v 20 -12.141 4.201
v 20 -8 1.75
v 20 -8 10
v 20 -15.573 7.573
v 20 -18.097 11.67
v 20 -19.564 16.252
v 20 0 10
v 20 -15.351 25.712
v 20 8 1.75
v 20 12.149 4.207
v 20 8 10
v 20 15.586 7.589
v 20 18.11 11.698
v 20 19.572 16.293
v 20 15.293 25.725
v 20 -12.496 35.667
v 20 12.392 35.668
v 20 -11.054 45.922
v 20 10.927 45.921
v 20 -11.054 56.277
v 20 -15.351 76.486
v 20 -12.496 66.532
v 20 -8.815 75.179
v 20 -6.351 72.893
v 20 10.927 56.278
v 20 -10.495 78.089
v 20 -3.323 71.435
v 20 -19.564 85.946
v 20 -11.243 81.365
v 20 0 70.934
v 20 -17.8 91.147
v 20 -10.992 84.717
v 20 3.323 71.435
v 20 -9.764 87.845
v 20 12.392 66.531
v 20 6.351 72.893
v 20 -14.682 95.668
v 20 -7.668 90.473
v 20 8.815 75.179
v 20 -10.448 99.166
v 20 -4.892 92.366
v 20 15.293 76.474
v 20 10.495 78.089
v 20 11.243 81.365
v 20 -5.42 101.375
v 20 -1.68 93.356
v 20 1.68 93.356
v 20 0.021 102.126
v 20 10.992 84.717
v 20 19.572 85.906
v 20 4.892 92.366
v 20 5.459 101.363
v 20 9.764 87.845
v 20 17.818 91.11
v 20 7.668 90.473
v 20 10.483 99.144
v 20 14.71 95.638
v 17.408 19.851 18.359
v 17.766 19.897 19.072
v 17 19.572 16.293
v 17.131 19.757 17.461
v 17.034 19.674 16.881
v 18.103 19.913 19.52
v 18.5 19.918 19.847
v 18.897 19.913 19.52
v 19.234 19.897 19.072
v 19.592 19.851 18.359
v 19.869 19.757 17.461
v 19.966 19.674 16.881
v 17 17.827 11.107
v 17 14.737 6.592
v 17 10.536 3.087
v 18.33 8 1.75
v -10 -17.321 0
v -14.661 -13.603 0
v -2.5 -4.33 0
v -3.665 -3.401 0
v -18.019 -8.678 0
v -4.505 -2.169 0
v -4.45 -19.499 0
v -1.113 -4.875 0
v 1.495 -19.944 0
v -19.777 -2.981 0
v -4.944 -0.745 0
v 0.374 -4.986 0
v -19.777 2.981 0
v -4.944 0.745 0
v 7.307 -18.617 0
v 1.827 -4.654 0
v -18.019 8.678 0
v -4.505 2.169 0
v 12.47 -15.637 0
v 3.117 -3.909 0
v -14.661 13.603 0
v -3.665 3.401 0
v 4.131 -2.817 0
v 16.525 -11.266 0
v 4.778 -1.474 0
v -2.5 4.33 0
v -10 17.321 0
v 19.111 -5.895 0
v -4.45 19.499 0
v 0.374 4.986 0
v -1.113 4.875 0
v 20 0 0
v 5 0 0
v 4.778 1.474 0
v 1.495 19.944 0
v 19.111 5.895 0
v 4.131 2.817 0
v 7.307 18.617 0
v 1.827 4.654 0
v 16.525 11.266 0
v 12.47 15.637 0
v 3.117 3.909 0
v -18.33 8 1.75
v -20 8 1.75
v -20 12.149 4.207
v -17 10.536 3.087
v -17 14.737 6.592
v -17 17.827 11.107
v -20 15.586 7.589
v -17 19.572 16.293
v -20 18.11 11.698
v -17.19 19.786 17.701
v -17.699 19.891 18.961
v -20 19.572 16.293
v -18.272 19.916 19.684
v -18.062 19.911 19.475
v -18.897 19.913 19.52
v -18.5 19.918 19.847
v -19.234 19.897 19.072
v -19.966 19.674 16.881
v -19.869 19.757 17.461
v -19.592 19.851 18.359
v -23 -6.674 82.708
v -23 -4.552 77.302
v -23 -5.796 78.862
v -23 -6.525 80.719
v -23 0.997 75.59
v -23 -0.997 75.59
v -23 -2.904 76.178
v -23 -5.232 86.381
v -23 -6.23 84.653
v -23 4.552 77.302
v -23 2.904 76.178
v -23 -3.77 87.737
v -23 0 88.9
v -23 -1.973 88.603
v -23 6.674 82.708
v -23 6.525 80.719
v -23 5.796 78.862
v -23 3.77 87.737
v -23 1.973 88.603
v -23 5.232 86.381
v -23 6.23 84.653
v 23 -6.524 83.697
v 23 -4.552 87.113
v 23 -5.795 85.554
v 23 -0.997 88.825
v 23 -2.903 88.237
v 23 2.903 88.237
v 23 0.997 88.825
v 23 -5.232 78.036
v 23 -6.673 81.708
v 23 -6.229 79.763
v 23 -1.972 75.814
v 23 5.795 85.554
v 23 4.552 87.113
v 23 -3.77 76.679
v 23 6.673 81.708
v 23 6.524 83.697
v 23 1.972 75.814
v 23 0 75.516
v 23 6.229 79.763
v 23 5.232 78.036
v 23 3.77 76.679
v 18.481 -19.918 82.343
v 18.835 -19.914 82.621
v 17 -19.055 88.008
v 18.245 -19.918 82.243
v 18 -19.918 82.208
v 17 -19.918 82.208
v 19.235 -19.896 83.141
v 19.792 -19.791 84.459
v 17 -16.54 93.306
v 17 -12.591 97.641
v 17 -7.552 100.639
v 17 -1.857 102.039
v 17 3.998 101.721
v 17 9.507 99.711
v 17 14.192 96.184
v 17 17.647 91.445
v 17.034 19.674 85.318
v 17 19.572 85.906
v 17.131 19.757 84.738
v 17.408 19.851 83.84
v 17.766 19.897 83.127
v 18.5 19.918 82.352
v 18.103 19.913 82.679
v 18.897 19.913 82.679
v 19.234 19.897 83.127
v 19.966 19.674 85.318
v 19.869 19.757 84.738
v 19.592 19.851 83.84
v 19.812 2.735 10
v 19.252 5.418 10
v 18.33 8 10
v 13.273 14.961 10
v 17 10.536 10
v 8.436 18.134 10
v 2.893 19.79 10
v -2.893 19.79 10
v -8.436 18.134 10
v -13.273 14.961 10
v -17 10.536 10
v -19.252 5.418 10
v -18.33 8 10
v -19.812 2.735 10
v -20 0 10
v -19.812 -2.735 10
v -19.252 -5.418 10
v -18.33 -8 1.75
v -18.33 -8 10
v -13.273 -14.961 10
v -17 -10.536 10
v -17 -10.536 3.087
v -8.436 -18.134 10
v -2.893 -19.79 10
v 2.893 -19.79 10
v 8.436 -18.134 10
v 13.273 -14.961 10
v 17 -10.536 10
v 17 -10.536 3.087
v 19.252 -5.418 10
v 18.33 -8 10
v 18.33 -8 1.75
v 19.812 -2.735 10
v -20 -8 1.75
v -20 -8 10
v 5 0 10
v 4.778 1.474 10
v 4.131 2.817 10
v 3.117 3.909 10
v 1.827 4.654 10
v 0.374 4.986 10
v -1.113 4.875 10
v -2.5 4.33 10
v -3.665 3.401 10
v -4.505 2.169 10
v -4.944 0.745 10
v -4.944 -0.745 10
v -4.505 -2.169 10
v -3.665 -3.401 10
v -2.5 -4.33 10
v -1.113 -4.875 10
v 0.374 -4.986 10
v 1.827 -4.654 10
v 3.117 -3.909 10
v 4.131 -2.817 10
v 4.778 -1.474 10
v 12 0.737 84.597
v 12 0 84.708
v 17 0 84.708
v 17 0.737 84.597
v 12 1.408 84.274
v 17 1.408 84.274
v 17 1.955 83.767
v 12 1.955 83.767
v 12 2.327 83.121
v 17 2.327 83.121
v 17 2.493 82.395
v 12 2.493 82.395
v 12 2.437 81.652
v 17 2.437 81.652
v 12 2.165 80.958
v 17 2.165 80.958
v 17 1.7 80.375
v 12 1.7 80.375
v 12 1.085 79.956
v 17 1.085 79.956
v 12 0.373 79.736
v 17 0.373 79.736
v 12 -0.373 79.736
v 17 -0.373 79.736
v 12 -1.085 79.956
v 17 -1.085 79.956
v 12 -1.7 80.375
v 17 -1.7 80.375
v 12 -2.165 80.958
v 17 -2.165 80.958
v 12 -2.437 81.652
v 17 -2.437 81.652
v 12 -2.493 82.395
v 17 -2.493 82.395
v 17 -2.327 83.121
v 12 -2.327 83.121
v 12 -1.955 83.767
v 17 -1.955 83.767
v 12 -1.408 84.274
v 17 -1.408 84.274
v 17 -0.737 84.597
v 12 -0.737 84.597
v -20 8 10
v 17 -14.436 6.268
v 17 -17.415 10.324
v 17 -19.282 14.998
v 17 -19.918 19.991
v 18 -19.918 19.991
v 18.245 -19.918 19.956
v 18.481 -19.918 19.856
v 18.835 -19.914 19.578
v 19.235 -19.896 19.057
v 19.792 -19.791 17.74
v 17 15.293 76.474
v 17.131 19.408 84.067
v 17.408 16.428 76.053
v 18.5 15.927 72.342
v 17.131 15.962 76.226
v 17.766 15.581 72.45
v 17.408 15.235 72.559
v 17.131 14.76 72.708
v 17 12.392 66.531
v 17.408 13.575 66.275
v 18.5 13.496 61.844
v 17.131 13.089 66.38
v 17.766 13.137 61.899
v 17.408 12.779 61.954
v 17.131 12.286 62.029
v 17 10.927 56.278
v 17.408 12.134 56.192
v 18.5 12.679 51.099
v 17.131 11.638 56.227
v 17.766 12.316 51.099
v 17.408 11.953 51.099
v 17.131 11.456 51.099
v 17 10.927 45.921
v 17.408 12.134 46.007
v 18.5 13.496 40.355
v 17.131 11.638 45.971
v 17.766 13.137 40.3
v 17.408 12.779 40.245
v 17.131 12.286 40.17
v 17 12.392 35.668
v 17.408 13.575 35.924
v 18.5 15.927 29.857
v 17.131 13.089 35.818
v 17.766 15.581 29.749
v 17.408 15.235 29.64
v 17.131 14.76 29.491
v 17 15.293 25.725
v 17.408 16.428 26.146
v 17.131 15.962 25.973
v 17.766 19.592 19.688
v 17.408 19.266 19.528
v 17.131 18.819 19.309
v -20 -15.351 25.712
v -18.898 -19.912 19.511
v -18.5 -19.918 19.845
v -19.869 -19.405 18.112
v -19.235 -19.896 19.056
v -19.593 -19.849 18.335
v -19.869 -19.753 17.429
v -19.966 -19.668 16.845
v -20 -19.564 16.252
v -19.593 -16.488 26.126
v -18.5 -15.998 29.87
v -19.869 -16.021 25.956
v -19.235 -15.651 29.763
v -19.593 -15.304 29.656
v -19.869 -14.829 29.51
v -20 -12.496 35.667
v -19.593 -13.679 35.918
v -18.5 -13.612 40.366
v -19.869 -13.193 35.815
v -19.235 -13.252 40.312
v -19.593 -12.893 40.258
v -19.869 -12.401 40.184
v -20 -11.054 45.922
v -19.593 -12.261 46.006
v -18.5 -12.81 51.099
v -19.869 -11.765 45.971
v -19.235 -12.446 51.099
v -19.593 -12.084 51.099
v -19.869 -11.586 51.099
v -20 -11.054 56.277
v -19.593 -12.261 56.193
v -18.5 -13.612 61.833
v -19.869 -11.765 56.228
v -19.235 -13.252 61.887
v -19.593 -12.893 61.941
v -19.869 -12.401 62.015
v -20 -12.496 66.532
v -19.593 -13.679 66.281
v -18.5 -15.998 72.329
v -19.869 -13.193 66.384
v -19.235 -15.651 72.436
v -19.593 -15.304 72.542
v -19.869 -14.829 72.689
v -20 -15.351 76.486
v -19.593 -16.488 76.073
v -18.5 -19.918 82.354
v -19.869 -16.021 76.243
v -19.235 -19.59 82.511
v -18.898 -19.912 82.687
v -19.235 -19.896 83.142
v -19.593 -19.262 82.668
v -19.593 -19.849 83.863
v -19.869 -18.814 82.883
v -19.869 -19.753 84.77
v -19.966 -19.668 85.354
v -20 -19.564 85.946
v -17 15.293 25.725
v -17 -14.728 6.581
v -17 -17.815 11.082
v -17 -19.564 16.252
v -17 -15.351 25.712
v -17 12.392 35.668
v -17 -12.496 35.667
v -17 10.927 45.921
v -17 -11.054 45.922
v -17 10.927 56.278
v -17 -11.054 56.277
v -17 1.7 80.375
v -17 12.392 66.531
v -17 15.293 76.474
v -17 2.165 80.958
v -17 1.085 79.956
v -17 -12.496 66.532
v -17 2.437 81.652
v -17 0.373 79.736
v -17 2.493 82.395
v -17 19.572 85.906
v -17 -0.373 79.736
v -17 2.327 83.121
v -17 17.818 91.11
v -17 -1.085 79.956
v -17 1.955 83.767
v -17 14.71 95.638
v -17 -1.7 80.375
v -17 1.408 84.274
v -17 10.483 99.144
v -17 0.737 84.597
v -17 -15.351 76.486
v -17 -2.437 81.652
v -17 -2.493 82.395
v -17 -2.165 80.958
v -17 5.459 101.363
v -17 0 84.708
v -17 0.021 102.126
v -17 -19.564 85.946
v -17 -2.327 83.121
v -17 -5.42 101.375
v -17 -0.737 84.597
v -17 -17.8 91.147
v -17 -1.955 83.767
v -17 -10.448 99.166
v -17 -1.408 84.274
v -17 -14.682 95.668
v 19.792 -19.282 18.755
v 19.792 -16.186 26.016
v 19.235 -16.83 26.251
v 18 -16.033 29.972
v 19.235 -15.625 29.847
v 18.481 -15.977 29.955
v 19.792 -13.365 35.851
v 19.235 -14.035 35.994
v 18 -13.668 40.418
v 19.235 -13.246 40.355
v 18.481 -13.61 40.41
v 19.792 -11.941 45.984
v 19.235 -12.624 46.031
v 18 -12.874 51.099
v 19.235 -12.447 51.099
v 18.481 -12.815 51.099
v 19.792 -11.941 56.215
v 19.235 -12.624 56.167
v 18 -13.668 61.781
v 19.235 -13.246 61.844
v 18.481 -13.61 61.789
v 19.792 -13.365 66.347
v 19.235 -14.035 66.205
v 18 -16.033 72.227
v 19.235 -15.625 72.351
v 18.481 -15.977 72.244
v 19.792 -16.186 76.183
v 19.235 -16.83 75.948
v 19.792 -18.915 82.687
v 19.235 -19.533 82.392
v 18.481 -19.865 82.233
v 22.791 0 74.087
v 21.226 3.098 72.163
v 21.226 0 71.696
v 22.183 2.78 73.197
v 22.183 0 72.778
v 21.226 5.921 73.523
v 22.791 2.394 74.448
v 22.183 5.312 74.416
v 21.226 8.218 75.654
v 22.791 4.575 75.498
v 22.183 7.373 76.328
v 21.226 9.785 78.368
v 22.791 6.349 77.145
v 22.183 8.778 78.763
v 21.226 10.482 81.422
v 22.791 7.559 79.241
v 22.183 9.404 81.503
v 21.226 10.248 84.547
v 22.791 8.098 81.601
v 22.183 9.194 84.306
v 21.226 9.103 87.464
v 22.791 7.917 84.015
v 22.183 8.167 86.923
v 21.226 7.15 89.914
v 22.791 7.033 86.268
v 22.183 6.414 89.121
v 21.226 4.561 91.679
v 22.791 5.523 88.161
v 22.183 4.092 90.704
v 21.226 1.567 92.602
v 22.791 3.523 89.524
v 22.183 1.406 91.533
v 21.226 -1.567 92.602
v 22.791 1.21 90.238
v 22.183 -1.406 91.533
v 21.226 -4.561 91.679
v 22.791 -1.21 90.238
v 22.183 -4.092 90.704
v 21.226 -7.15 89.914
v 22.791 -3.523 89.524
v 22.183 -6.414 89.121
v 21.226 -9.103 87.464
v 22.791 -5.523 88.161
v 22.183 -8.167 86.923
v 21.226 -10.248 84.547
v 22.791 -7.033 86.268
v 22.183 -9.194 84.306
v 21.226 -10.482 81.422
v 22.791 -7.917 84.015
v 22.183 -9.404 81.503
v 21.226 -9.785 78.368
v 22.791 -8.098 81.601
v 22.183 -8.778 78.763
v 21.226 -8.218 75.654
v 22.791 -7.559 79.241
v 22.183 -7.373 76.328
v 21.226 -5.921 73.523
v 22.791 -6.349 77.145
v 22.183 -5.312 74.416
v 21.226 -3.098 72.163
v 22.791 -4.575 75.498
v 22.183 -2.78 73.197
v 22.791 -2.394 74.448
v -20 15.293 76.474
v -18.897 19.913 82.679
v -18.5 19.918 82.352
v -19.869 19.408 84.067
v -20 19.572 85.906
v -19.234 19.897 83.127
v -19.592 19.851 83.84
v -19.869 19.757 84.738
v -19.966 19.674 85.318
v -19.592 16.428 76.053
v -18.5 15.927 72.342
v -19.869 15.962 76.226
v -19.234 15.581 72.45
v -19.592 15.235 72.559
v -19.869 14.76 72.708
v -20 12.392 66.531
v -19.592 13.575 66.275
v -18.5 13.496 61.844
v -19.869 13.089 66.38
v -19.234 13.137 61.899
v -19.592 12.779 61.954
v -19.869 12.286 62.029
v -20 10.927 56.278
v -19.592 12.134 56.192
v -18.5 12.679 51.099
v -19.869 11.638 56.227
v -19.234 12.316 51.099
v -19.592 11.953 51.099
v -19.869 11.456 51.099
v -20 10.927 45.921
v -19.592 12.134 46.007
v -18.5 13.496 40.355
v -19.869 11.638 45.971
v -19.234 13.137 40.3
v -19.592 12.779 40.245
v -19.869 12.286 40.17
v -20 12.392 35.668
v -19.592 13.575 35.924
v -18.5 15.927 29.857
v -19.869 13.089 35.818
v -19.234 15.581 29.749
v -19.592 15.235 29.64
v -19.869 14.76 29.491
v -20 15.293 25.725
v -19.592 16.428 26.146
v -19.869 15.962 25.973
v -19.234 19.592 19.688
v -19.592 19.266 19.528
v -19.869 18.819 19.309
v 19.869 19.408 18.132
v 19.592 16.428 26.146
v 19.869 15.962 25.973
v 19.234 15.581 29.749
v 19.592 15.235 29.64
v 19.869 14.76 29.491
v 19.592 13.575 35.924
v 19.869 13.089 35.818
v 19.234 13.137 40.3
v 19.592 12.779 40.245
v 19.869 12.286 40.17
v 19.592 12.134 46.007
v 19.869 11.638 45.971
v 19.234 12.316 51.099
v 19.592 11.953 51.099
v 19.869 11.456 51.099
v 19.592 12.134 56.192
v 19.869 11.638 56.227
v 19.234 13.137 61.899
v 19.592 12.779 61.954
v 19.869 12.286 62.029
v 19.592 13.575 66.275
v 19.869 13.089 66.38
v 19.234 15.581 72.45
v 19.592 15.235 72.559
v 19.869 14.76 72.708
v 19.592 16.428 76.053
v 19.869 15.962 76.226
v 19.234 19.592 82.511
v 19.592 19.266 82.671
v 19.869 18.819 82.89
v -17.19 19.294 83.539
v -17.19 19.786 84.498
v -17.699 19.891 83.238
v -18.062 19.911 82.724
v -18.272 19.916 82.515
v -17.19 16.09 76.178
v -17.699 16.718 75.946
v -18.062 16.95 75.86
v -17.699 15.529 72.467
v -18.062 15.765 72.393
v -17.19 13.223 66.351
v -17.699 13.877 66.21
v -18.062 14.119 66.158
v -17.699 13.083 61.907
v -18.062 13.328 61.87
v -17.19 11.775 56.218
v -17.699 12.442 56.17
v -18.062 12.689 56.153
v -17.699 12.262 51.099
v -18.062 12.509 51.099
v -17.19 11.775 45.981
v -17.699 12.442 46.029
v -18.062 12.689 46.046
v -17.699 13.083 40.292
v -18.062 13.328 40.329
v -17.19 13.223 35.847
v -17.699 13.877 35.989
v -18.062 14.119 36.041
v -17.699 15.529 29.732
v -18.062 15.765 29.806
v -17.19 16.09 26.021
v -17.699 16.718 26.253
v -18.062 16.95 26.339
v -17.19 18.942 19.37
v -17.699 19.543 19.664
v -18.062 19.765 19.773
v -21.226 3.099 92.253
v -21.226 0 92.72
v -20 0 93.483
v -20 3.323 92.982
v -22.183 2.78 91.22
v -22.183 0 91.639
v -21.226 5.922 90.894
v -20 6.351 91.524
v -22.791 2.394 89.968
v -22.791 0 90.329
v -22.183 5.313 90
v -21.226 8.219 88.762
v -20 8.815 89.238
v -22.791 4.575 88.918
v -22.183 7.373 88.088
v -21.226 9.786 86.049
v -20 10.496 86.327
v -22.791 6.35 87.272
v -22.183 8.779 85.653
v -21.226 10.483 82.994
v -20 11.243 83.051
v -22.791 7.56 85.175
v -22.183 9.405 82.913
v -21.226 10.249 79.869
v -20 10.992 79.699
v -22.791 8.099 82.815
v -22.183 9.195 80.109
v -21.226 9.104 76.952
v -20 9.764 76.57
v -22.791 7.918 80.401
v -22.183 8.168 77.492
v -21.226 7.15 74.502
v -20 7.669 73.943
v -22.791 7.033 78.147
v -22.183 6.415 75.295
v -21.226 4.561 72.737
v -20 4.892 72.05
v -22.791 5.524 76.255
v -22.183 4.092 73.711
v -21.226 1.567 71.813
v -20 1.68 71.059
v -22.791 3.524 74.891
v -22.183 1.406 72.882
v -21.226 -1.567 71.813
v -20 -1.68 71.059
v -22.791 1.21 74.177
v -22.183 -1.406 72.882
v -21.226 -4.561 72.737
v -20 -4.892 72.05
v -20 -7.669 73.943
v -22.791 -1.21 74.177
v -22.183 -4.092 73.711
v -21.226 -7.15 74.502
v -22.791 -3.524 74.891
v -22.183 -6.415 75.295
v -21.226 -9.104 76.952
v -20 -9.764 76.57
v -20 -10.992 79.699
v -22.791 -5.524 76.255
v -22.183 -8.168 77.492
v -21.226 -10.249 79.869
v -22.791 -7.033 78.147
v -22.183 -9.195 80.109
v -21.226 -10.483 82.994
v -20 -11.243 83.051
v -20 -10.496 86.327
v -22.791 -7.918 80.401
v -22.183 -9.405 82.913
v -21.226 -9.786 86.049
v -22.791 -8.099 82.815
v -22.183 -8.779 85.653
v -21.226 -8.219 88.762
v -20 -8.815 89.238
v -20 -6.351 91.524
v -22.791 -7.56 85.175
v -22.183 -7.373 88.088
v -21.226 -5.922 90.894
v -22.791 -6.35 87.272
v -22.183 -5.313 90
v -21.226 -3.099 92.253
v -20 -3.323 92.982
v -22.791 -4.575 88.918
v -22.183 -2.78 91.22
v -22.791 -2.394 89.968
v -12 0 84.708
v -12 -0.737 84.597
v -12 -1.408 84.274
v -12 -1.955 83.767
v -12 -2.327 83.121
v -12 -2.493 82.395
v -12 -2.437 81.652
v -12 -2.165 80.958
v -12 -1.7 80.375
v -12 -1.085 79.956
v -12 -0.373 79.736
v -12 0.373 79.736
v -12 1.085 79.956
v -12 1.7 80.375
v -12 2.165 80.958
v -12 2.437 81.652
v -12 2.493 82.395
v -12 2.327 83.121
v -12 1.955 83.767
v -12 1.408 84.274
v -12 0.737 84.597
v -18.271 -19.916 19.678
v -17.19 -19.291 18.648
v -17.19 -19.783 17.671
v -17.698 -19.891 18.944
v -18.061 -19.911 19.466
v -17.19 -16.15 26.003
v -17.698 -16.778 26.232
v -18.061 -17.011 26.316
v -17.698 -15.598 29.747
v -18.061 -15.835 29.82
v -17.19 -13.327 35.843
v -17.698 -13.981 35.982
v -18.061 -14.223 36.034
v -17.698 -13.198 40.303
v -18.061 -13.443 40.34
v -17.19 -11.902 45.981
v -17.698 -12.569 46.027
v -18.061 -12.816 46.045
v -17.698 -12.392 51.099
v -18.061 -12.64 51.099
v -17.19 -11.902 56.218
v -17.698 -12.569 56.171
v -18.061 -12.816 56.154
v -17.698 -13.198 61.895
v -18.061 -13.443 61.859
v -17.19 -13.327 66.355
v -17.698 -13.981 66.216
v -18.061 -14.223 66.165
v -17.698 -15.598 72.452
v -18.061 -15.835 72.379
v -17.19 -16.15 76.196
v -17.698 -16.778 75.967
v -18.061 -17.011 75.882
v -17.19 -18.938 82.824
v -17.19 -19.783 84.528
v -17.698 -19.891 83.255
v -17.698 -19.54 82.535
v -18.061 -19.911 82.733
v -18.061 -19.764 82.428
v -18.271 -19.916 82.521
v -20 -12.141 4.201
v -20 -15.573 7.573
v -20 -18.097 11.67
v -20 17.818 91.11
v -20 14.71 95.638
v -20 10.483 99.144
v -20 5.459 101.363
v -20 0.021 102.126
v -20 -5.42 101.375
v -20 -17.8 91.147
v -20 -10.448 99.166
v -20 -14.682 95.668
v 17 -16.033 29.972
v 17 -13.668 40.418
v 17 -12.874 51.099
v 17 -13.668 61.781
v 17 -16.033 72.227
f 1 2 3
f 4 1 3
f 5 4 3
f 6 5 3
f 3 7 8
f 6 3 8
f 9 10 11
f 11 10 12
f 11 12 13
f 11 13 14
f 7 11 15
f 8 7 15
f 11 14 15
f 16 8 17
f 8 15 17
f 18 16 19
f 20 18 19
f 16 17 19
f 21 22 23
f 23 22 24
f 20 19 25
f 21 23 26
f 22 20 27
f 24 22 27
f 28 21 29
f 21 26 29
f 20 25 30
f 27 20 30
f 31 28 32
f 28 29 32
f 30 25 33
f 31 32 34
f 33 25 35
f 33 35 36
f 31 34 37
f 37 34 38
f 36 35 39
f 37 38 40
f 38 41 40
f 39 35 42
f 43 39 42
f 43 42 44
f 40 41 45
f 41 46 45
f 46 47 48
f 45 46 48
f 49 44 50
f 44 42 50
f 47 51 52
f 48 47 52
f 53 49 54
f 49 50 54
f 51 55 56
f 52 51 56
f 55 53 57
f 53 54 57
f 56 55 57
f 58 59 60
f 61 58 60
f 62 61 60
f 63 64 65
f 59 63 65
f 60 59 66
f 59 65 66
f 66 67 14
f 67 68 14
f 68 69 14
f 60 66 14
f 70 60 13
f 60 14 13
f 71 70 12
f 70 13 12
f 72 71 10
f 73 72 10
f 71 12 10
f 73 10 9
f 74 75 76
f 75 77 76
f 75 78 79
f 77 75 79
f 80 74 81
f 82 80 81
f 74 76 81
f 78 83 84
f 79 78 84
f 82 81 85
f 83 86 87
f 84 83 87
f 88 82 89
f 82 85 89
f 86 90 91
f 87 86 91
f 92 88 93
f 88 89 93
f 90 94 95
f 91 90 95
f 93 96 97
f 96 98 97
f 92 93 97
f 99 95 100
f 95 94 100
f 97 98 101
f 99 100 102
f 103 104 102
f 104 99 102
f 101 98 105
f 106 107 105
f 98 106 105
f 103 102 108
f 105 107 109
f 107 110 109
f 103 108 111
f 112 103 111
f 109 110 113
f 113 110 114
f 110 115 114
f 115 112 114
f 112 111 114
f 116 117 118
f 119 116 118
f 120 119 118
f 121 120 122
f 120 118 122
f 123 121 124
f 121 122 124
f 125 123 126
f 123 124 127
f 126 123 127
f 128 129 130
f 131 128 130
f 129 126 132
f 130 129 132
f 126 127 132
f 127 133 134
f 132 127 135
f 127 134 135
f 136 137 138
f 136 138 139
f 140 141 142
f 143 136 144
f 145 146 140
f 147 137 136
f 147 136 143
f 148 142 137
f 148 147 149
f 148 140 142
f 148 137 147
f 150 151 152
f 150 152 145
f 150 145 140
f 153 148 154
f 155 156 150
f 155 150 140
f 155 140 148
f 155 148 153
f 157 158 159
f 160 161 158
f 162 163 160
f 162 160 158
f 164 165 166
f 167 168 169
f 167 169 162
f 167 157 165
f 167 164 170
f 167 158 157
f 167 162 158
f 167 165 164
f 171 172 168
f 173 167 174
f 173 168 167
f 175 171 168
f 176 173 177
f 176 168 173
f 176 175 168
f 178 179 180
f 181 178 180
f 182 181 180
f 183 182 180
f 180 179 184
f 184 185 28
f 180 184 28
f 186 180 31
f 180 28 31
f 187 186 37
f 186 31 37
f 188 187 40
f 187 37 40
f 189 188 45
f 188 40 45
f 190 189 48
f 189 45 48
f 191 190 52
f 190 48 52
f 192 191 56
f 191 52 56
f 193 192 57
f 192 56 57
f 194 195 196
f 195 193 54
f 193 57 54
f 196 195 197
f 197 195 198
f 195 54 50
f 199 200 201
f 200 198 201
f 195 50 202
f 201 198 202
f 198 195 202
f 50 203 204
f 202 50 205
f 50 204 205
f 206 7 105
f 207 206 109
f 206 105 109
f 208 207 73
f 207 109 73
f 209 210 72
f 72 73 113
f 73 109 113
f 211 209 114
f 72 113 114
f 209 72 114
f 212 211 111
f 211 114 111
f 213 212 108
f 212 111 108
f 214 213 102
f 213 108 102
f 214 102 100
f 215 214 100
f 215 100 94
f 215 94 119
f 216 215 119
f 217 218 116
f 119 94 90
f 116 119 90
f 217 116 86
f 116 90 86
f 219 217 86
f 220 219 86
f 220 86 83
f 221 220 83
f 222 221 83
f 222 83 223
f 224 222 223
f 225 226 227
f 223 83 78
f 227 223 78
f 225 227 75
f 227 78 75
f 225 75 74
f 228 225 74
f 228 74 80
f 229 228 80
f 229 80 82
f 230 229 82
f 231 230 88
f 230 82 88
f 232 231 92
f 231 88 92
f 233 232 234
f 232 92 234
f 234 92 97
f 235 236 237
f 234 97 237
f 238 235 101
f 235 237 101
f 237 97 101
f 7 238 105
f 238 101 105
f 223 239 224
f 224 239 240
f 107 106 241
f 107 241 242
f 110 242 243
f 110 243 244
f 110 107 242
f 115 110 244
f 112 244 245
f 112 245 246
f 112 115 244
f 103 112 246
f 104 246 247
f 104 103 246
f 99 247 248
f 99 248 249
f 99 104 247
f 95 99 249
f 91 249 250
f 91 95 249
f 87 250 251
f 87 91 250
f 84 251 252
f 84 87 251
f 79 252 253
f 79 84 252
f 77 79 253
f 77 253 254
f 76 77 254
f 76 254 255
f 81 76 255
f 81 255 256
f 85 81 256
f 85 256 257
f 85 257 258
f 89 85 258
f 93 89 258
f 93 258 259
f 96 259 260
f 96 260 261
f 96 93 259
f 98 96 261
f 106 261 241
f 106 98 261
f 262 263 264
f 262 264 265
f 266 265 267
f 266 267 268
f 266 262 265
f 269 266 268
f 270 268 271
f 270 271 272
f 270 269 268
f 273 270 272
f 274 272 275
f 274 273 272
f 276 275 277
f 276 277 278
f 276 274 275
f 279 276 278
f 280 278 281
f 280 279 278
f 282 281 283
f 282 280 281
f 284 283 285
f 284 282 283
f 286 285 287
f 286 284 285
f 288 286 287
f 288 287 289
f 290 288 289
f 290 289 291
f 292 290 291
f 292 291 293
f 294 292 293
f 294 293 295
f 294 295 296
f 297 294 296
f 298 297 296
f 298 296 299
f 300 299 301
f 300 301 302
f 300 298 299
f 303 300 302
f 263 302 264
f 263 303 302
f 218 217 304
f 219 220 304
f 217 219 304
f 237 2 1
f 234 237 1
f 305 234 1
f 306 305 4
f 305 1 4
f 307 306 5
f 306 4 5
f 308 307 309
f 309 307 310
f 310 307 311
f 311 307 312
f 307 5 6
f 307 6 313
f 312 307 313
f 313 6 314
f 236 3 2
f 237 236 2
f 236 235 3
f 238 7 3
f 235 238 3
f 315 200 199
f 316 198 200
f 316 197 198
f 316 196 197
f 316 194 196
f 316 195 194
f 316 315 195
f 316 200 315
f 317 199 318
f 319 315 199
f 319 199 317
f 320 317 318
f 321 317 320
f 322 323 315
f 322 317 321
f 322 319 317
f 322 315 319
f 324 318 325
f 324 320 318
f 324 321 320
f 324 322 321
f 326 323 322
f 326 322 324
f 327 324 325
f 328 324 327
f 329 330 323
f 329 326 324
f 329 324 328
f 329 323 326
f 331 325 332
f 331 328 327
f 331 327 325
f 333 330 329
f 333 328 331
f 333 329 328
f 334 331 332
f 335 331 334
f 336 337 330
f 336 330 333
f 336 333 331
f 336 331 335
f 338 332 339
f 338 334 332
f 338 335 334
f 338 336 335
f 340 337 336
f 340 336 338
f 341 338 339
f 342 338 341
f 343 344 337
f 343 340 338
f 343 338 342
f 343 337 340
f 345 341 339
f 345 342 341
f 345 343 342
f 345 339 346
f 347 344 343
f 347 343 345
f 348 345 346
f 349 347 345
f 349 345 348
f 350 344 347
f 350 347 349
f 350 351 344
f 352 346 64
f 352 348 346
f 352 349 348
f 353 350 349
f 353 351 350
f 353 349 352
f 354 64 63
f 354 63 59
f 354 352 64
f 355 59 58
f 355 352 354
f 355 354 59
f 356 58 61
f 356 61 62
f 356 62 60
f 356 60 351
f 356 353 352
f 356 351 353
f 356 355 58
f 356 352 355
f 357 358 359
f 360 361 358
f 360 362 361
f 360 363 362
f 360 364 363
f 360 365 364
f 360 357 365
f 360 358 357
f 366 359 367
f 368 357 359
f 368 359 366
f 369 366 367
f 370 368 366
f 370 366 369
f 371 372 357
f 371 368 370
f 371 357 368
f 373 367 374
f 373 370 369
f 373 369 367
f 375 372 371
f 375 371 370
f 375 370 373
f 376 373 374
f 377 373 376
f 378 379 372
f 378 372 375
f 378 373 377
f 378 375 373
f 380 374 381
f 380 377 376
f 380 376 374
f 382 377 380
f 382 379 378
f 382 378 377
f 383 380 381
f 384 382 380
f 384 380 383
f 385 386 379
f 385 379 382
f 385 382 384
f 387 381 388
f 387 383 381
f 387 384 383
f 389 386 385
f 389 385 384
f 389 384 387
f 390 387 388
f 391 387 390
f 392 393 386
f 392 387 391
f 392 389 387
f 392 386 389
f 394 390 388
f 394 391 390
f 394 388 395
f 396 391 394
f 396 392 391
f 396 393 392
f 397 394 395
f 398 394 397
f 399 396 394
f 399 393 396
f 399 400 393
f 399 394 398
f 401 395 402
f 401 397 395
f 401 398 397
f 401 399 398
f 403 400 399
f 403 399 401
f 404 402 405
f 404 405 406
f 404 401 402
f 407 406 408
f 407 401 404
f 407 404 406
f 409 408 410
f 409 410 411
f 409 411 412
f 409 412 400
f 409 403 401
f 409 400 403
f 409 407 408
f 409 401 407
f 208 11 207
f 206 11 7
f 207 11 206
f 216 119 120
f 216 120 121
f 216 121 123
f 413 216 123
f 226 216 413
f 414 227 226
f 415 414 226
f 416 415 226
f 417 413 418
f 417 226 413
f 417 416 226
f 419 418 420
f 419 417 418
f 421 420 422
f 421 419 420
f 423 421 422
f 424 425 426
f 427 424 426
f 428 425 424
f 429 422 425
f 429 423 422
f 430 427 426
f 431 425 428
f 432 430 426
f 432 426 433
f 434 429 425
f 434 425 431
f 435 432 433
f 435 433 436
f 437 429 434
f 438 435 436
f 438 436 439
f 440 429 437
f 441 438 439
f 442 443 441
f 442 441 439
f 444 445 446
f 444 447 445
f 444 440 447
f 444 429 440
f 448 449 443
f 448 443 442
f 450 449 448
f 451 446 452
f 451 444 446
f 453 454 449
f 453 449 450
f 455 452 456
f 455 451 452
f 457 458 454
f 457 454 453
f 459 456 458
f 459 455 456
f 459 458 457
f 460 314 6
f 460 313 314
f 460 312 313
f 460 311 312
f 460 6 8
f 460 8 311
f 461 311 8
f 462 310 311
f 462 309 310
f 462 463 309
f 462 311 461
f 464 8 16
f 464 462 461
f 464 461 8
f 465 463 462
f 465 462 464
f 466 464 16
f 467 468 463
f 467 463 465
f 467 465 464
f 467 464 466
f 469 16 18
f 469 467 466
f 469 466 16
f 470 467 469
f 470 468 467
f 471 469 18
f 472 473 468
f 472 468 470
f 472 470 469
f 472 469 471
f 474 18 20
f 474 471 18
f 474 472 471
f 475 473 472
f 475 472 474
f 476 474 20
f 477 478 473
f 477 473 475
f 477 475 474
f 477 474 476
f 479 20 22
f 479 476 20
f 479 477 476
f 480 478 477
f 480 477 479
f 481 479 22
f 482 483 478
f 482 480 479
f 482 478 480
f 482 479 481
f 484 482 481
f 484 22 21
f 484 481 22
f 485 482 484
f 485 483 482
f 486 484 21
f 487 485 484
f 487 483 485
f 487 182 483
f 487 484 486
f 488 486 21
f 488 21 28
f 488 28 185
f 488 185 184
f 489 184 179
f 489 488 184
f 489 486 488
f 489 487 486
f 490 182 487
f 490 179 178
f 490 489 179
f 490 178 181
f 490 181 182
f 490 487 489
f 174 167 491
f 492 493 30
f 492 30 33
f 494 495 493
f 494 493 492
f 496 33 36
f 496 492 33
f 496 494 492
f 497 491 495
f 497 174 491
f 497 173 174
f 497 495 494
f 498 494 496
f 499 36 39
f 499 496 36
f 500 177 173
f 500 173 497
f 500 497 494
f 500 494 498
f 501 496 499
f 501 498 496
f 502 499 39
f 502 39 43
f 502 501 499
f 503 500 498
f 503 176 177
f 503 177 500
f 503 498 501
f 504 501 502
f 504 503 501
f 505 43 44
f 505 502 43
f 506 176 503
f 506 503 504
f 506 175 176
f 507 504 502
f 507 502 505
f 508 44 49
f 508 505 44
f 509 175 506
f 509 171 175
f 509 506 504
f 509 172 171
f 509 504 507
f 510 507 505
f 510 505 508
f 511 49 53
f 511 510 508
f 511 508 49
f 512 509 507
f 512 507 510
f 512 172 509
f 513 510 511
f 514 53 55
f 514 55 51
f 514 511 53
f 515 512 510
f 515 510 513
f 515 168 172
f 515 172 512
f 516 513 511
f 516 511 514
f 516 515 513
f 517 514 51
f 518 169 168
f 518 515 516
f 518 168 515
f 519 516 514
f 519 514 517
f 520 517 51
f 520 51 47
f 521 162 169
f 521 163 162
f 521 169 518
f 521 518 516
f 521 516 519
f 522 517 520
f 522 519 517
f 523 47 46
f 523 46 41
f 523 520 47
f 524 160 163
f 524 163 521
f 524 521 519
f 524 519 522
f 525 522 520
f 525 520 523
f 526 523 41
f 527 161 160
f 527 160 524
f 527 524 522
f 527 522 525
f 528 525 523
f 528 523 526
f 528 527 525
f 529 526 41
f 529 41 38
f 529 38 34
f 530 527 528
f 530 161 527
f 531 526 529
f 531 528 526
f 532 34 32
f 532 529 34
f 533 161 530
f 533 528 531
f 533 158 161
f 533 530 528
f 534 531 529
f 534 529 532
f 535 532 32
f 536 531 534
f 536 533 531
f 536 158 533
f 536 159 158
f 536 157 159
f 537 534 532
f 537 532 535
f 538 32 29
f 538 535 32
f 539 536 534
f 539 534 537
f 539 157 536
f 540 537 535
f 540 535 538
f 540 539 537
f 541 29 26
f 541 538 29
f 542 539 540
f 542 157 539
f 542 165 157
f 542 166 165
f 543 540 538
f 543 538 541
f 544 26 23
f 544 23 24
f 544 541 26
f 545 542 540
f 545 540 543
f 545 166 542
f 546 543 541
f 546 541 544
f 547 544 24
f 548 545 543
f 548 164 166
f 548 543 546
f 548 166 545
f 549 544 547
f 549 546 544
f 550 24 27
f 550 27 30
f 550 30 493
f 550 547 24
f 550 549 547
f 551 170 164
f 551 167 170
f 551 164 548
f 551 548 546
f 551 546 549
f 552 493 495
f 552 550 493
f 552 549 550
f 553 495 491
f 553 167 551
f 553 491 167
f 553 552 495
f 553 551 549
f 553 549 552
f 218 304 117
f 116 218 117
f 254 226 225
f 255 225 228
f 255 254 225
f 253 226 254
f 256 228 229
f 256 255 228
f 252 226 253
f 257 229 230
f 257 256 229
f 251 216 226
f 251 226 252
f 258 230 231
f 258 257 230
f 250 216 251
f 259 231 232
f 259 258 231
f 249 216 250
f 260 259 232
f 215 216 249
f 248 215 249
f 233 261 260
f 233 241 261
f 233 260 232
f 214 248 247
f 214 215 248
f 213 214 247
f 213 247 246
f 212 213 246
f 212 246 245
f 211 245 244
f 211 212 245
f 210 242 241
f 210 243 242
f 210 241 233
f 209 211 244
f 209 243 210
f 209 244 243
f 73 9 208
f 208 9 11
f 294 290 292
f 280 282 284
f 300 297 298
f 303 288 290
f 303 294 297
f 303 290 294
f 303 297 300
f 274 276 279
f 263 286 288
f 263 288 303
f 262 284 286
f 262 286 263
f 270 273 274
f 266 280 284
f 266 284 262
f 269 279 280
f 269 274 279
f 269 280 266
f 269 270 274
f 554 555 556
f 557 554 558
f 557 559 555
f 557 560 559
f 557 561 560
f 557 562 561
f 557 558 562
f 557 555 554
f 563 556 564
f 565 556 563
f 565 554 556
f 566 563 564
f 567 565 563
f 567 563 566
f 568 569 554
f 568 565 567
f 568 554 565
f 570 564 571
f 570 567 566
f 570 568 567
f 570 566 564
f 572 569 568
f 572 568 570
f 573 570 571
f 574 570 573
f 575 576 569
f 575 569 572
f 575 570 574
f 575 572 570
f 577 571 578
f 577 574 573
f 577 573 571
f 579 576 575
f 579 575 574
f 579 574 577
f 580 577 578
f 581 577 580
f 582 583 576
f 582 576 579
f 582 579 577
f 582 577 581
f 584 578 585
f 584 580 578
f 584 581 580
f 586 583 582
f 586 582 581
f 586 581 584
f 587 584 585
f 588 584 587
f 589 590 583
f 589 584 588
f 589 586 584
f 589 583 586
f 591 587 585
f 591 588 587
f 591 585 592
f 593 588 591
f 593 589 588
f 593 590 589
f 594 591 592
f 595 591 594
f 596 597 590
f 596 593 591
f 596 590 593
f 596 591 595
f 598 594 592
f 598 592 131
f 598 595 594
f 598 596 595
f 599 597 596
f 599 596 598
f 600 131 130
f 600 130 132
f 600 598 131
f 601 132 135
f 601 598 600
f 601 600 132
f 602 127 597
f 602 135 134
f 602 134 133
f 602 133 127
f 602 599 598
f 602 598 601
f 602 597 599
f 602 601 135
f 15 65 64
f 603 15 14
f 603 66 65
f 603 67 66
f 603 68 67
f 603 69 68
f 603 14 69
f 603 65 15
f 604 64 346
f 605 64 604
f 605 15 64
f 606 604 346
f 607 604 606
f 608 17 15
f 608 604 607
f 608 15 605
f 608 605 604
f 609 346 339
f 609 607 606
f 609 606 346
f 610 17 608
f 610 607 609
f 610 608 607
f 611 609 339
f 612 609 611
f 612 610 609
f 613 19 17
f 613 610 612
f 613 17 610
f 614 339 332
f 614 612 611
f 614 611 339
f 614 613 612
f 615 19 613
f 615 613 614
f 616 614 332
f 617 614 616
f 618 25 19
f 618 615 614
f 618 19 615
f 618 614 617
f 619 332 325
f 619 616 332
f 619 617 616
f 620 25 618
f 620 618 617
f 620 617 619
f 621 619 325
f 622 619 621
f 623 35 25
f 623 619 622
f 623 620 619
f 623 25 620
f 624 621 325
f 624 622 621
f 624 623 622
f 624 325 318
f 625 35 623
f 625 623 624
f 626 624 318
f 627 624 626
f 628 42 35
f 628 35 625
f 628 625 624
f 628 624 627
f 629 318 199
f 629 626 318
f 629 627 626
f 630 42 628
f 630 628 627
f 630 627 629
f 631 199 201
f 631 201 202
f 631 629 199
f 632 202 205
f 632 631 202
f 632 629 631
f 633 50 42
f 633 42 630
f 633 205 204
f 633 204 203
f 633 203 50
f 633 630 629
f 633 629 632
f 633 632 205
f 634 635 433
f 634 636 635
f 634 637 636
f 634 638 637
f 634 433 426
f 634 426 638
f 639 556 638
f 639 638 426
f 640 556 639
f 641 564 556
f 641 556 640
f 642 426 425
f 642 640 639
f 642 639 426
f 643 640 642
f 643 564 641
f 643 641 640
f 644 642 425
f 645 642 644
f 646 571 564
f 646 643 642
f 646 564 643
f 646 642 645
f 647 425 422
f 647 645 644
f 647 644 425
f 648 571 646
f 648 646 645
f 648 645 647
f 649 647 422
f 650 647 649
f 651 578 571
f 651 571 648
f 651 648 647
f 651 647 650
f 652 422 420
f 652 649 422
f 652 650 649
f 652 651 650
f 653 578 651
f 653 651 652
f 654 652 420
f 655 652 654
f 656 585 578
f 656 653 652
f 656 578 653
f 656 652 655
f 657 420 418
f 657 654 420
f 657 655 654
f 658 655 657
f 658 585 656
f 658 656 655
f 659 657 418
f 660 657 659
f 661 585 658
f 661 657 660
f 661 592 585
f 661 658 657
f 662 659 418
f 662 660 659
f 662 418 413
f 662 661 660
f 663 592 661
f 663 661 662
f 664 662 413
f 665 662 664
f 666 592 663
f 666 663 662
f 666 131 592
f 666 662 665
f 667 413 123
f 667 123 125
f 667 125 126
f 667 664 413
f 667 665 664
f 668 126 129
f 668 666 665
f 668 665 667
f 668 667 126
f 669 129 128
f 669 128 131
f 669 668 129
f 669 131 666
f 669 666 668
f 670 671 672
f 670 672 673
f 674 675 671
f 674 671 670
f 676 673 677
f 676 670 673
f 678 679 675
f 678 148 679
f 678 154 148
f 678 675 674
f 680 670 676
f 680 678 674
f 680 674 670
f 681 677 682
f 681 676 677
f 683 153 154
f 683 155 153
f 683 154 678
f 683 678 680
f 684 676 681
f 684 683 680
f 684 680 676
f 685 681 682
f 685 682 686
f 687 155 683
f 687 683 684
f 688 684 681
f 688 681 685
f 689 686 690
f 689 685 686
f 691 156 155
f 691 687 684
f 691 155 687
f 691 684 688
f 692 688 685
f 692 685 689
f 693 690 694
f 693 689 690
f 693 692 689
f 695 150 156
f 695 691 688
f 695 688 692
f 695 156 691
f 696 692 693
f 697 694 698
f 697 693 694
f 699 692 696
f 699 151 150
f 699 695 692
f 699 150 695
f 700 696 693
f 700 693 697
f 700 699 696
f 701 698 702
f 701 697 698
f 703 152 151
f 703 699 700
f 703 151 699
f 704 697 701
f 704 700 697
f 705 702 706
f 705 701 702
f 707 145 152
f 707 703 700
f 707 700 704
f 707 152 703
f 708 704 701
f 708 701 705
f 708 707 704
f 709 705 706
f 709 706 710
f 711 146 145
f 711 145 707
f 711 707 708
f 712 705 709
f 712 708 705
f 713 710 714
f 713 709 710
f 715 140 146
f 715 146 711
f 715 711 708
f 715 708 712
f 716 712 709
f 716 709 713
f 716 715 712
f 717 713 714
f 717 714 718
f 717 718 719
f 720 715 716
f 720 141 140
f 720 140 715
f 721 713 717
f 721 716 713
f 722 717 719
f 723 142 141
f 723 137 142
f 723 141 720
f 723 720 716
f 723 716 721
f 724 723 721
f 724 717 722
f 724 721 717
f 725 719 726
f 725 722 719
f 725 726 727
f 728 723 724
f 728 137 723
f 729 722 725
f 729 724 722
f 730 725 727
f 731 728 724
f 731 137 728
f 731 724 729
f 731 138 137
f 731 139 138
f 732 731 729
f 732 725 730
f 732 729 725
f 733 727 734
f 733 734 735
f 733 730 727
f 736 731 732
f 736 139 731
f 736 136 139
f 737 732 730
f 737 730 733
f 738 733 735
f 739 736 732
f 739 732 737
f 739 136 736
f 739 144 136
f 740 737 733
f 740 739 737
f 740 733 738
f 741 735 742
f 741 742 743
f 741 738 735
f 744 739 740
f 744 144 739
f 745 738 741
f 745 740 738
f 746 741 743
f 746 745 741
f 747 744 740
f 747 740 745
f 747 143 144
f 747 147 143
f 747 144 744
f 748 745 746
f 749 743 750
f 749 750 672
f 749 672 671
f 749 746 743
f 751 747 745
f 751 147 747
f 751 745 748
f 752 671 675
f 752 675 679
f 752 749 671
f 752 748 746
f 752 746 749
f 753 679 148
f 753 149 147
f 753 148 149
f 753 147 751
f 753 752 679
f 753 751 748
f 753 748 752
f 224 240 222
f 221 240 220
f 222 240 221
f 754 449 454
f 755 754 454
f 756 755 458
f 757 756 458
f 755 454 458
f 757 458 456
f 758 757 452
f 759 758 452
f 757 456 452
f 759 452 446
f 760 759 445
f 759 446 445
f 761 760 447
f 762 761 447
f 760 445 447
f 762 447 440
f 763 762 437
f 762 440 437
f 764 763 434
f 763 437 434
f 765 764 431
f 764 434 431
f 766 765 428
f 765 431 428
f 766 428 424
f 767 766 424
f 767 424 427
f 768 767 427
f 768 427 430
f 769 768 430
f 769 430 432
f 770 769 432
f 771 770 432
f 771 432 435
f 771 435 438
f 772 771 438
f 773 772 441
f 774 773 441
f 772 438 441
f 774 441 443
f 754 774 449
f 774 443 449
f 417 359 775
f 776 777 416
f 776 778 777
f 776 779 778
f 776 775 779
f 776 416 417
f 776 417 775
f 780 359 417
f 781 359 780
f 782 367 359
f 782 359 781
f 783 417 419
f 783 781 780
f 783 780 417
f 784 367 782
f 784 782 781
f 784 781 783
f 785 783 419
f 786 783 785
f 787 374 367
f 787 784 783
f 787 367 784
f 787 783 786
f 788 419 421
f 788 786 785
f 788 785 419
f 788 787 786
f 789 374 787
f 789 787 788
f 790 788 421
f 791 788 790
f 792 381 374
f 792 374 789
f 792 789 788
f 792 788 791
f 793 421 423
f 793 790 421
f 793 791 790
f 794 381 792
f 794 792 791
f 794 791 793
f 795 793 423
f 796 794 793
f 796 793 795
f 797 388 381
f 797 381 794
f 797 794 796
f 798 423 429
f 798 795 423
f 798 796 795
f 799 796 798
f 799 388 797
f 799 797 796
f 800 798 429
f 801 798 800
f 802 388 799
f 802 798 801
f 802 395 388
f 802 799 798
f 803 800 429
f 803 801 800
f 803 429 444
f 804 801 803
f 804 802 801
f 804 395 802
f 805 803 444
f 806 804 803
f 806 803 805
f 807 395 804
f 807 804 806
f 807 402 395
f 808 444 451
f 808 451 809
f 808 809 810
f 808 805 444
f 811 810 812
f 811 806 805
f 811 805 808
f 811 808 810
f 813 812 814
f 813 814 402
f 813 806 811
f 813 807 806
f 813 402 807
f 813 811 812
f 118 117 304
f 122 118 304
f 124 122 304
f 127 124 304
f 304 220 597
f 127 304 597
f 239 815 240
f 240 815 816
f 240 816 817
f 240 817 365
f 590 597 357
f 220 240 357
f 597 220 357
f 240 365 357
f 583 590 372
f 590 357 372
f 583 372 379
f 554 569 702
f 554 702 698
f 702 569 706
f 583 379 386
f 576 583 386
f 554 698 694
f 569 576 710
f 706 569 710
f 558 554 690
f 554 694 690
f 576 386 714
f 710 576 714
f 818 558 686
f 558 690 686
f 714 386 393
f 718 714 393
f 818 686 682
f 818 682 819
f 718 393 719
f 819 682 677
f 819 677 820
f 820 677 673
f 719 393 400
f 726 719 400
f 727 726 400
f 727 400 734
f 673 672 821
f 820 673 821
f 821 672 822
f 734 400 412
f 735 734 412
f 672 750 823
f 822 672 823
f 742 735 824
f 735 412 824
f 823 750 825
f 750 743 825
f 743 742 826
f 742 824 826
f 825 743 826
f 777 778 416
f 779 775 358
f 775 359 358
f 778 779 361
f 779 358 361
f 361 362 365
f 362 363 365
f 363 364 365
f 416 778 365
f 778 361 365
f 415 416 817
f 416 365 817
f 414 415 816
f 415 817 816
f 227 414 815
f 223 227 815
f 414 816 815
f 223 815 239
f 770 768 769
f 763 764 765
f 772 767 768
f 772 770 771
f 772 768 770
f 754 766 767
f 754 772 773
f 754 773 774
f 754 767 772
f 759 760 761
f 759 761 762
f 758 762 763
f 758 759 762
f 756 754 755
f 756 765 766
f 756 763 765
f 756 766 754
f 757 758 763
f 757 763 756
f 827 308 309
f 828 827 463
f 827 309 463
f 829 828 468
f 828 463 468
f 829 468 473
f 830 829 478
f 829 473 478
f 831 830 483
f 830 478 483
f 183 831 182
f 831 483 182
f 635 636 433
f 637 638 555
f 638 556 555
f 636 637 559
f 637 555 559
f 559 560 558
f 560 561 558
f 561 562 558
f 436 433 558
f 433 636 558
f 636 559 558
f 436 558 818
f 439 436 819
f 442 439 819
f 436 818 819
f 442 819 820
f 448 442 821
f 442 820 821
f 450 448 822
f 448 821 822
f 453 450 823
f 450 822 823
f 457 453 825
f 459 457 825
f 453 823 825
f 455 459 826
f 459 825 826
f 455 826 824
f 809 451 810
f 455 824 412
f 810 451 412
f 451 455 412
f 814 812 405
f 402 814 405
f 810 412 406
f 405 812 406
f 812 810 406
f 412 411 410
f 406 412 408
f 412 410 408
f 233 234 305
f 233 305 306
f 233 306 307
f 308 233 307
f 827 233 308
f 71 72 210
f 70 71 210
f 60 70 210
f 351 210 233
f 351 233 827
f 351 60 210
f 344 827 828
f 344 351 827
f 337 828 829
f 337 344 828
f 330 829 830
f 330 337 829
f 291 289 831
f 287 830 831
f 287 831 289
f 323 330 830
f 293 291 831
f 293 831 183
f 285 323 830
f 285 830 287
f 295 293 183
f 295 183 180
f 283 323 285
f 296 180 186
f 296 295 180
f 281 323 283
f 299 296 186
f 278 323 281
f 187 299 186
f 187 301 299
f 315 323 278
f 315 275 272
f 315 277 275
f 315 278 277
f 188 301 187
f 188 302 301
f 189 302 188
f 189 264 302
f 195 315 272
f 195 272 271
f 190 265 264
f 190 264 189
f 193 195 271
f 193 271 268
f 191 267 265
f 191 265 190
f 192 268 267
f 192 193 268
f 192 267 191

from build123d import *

# Parameters (mm, degrees)
SKETCH2_R           = 20
SKETCH2_R_2         = 5
BOSS_EXTRUDE1_DEPTH = 10
BOSS_EXTRUDE2_DEPTH = 3
CIRPATTERN1_COUNT   = 2
SKETCH5_R           = 2.5
BOSS_EXTRUDE3_DEPTH = 5
BOSS_EXTRUDE4_START = 5
SKETCH6_R           = 2.5
BOSS_EXTRUDE4_DEPTH = 5
CUT_EXTRUDE1_DEPTH  = 147
FILLET1_R           = 2
SKETCH8_R           = 11.27429685
BOSS_EXTRUDE5_DEPTH = 3
FILLET2_R           = 5
SKETCH9_R           = 11.275
BOSS_EXTRUDE6_DEPTH = 3
FILLET3_R           = 5


with BuildPart() as part:
    # Sketch2 → Boss-Extrude1 (new body)
    with BuildSketch(Plane.XY):
        Circle(SKETCH2_R)
        Circle(SKETCH2_R_2, mode=Mode.SUBTRACT)
    extrude(amount=BOSS_EXTRUDE1_DEPTH)

    # Sketch4 → Boss-Extrude2 (add)
    with BuildSketch(Plane(origin=(20, 0, 0), x_dir=(0, 0, -1), z_dir=(1, 0, 0))):
        with BuildLine():
            Line((-82.207951234, 19.918138143), (-19.990870076, 19.918138143))
            ThreePointArc((-19.990870076, 19.918138143), (-9.096212625, 16.67449148), (-1.749920893, 8))
            Line((-1.749920893, 8), (-10, 8))
            Line((-10, 8), (-10, -8))
            Line((-10, -8), (-1.749920893, -8))
            ThreePointArc((-1.749920893, -8), (-9.096212625, -16.67449148), (-19.990870076, -19.918138143))
            Line((-19.990870076, -19.918138143), (-82.207951234, -19.918138143))
            ThreePointArc((-82.207951234, -19.918138143), (-102.126089377, 0), (-82.207951234, 19.918138143))
        make_face()
    boss_extrude2 = extrude(amount=-BOSS_EXTRUDE2_DEPTH)

    # CirPattern1: Boss-Extrude2 ×2 about axis
    cirpattern1_axis = Axis((0, 0, 0), (0, 0, 1))
    for i in range(1, CIRPATTERN1_COUNT):
        add(boss_extrude2.rotate(cirpattern1_axis, i * 360 / CIRPATTERN1_COUNT))

    # Sketch5 → Boss-Extrude3 (add)
    with BuildSketch(Plane(origin=(-17, 0, 0), x_dir=(0, 0, -1), z_dir=(1, 0, 0))):
        with Locations(Location((-82.207951234, 0, 0), (0, 0, 180))):
            Circle(SKETCH5_R)
    extrude(amount=BOSS_EXTRUDE3_DEPTH)

    # Sketch6 → Boss-Extrude4 (add)
    with BuildSketch(Plane.ZY.offset(-17).offset(BOSS_EXTRUDE4_START)):
        with Locations((82.207951234, 0)):
            Circle(SKETCH6_R)
    extrude(amount=-BOSS_EXTRUDE4_DEPTH)

    # Sketch7 → Cut-Extrude1 (cut)
    with BuildSketch(Plane(origin=(20, 0, 0), x_dir=(0, 0, -1), z_dir=(1, 0, 0))):
        with BuildLine():
            Line((-82.207951234, 19.918138143), (-19.990870076, 19.918138143))
            ThreePointArc((-19.990870076, 19.918138143), (-51.099410655, 12.742712192), (-82.207951234, 19.918138143))
        make_face()
        with BuildLine():
            Line((-82.207951234, -19.918138143), (-19.990870076, -19.918138143))
            ThreePointArc((-19.990870076, -19.918138143), (-51.099410655, -12.873612926), (-82.207951234, -19.918138143))
        make_face()
    extrude(amount=-CUT_EXTRUDE1_DEPTH, mode=Mode.SUBTRACT)

    # Fillet1
    # the kernel refuses this fillet: 2 mm, written as the material it takes off along each edge
    with BuildSketch(Plane(origin=(-20, -85.083350362, 51.099410655), x_dir=(0, 0.8704701074712403, -0.49222128356970424), z_dir=(0, -0.49222128356970424, -0.8704701074712403))) as fillet1_piece_1:
        with BuildLine():
            CenterArc((72.209737436 + FILLET1_R, FILLET1_R), FILLET1_R, 180, 90)
            Line((72.209737436 + FILLET1_R, 0), (72.209737436, 0))
            Line((72.209737436, 0), (72.209737436, FILLET1_R))
        make_face()
    revolve(axis=Axis((-20, -85.083350362, 51.099410655), (1, 0, 0)), revolution_arc=58.973369899, mode=Mode.SUBTRACT)
    with BuildSketch(Plane(origin=(-17, -85.083350362, 51.099410655), x_dir=(0, 0.8704701074712403, -0.49222128356970424), z_dir=(0, -0.49222128356970424, -0.8704701074712403))) as fillet1_piece_2:
        with BuildLine():
            CenterArc((72.209737436 + FILLET1_R, -FILLET1_R), FILLET1_R, 90, 90)
            Line((72.209737436, -FILLET1_R), (72.209737436, 0))
            Line((72.209737436, 0), (72.209737436 + FILLET1_R, 0))
        make_face()
    revolve(axis=Axis((-17, -85.083350362, 51.099410655), (1, 0, 0)), revolution_arc=58.973369899, mode=Mode.SUBTRACT)
    with BuildSketch(Plane(origin=(-17, 83.764839764, 51.099410655), x_dir=(0, -0.8659267657003706, 0.5001708072685723), z_dir=(0, 0.5001708072685723, 0.8659267657003706))) as fillet1_piece_3:
        with BuildLine():
            CenterArc((71.022127572 + FILLET1_R, -FILLET1_R), FILLET1_R, 90, 90)
            Line((71.022127572, -FILLET1_R), (71.022127572, 0))
            Line((71.022127572, 0), (71.022127572 + FILLET1_R, 0))
        make_face()
    revolve(axis=Axis((-17, 83.764839764, 51.099410655), (1, 0, 0)), revolution_arc=60.022602323, mode=Mode.SUBTRACT)
    with BuildSketch(Plane(origin=(-20, 83.764839764, 51.099410655), x_dir=(0, -0.8659267657003706, 0.5001708072685723), z_dir=(0, 0.5001708072685723, 0.8659267657003706))) as fillet1_piece_4:
        with BuildLine():
            CenterArc((71.022127572 + FILLET1_R, FILLET1_R), FILLET1_R, 180, 90)
            Line((71.022127572 + FILLET1_R, 0), (71.022127572, 0))
            Line((71.022127572, 0), (71.022127572, FILLET1_R))
        make_face()
    revolve(axis=Axis((-20, 83.764839764, 51.099410655), (1, 0, 0)), revolution_arc=60.022602323, mode=Mode.SUBTRACT)
    with BuildSketch(Plane(origin=(17, 83.764839764, 51.099410655), x_dir=(0, -0.8659267657003706, 0.5001708072685723), z_dir=(0, 0.5001708072685723, 0.8659267657003706))) as fillet1_piece_5:
        with BuildLine():
            CenterArc((71.022127572 + FILLET1_R, FILLET1_R), FILLET1_R, 180, 90)
            Line((71.022127572, FILLET1_R), (71.022127572, 0))
            Line((71.022127572, 0), (71.022127572 + FILLET1_R, 0))
        make_face()
    revolve(axis=Axis((17, 83.764839764, 51.099410655), (1, 0, 0)), revolution_arc=60.022602323, mode=Mode.SUBTRACT)
    with BuildSketch(Plane(origin=(20, -85.083350362, 51.099410655), x_dir=(0, 0.8704701074712403, -0.49222128356970424), z_dir=(0, -0.49222128356970424, -0.8704701074712403))) as fillet1_piece_6:
        with BuildLine():
            CenterArc((72.209737436 + FILLET1_R, -FILLET1_R), FILLET1_R, 90, 90)
            Line((72.209737436, -FILLET1_R), (72.209737436, 0))
            Line((72.209737436, 0), (72.209737436 + FILLET1_R, 0))
        make_face()
    revolve(axis=Axis((20, -85.083350362, 51.099410655), (1, 0, 0)), revolution_arc=58.973369899, mode=Mode.SUBTRACT)
    with BuildSketch(Plane(origin=(20, 83.764839764, 51.099410655), x_dir=(0, -0.8659267657003705, -0.5001708072685725), z_dir=(0, 0.5001708072685725, -0.8659267657003705))) as fillet1_piece_7:
        with BuildLine():
            CenterArc((71.022127572 + FILLET1_R, FILLET1_R), FILLET1_R, 180, 90)
            Line((71.022127572, FILLET1_R), (71.022127572, 0))
            Line((71.022127572, 0), (71.022127572 + FILLET1_R, 0))
        make_face()
    revolve(axis=Axis((20, 83.764839764, 51.099410655), (-1, 0, 0)), revolution_arc=60.022602323, mode=Mode.SUBTRACT)

    # Sketch8 → Boss-Extrude5 (add)
    with BuildSketch(Plane(origin=(20, 0, 0), x_dir=(0, 0, -1), z_dir=(1, 0, 0))):
        with Locations((-82.207951234, 0)):
            Circle(SKETCH8_R)
    extrude(amount=BOSS_EXTRUDE5_DEPTH)

    # Fillet2
    # the kernel refuses this fillet: 5 mm, written as the material it takes off along each edge
    with BuildSketch(Plane(origin=(23, 0, 82.207951234), x_dir=(0, 0, -1), z_dir=(0, -1, 0))) as fillet2_piece_1:
        with BuildLine():
            CenterArc((6.691721155, -5), FILLET2_R, 23.578178478, 66.421821522)
            Line((6.691721155, 0), (6.691721155, 0.1))
            Line((6.691721155, 0.1), (11.27429685, 0.1))
            Line((11.27429685, 0.1), (11.37429685, 0))
            ThreePointArc((11.37429685, 0), (11.37429685, -1.5), (11.365948364, -2.96))
            Line((11.365948364, -2.96), (11.27429685, -3))
        make_face()
    revolve(axis=Axis((23, 0, 82.207951234), (1, 0, 0)), mode=Mode.SUBTRACT)

    # Sketch9 → Boss-Extrude6 (add)
    with BuildSketch(Plane.ZY.offset(20)):
        with Locations((82.207951234, 0)):
            Circle(SKETCH9_R)
    extrude(amount=BOSS_EXTRUDE6_DEPTH)

    # Fillet3
    # the kernel refuses this fillet: 5 mm, written as the material it takes off along each edge
    with BuildSketch(Plane(origin=(-23, 0, 82.207951234), x_dir=(0, 0, 1), z_dir=(0, -1, 0))) as fillet3_piece_1:
        with BuildLine():
            CenterArc((6.692424305, -5), FILLET3_R, 23.578178478, 66.421821522)
            Line((6.692424305, 0), (6.692424305, 0.1))
            Line((6.692424305, 0.1), (11.275, 0.1))
            Line((11.275, 0.1), (11.375, 0))
            ThreePointArc((11.375, 0), (11.375, -1.5), (11.366651514, -2.96))
            Line((11.366651514, -2.96), (11.275, -3))
        make_face()
    revolve(axis=Axis((-23, 0, 82.207951234), (-1, 0, 0)), mode=Mode.SUBTRACT)


solid = part.part
